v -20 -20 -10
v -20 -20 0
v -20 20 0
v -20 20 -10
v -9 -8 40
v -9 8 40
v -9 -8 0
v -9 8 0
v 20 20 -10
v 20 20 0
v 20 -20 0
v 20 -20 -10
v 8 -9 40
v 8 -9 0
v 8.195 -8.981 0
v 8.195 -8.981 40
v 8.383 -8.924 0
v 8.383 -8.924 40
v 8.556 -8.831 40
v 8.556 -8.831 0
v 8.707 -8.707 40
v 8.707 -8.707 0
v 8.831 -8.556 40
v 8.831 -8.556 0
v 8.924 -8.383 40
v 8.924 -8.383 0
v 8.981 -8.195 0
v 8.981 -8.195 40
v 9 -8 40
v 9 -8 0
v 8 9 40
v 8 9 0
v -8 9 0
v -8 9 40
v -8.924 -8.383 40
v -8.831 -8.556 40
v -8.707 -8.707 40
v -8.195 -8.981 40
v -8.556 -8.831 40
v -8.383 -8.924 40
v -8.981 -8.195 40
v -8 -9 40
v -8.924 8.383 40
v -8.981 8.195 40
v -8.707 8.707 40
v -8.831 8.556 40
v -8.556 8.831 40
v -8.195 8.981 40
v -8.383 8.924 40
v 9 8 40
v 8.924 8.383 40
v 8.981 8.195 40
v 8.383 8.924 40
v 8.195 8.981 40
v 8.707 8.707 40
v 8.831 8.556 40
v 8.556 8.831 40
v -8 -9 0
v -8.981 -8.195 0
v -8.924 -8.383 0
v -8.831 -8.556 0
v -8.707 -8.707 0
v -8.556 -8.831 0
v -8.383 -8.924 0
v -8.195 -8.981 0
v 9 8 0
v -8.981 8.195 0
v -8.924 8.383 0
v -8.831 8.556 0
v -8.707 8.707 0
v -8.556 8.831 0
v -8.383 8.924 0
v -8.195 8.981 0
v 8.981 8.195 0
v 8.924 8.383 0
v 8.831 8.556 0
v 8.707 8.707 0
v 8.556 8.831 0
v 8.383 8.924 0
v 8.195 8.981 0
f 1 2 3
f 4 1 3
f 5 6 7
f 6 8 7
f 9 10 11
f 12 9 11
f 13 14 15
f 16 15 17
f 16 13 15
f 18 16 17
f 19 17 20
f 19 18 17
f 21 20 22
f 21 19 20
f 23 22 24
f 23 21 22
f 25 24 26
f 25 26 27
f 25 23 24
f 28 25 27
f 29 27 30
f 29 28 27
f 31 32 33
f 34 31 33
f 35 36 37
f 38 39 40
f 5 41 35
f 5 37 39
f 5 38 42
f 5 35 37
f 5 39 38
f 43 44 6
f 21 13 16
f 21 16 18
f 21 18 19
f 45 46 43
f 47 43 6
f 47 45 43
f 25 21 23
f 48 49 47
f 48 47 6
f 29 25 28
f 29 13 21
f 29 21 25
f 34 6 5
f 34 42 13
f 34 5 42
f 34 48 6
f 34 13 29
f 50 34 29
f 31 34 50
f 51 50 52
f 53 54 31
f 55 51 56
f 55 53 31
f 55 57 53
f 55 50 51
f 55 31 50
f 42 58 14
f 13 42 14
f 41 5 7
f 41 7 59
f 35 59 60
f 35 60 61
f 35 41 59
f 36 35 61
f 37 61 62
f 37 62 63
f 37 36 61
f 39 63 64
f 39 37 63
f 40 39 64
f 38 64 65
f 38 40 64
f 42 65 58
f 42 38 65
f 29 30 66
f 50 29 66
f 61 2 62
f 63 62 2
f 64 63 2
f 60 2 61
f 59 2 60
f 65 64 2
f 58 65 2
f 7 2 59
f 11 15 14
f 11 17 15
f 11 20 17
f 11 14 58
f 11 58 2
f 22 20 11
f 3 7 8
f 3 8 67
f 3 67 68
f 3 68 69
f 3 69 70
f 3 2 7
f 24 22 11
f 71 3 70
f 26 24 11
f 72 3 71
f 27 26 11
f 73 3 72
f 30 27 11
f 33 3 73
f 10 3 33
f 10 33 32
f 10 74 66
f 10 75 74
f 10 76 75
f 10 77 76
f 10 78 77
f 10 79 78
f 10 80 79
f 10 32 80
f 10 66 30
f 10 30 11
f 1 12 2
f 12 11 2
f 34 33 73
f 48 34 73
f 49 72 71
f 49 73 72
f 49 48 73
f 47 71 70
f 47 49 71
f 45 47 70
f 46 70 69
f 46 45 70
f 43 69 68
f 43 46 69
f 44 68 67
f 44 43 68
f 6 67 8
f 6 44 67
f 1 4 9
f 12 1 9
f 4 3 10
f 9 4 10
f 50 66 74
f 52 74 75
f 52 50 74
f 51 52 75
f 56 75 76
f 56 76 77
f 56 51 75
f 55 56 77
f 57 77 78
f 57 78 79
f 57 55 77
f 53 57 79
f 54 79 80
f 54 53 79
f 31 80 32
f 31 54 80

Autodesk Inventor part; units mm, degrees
ref_plane "YZ Plane" through (0, 0, 0) normal (1, 0, 0) x (0, 1, 0)
ref_plane "XZ Plane" through (0, 0, 0) normal (0, 1, 0) x (-1, 0, 0)
ref_plane "XY Plane" through (0, 0, 0) normal (0, 0, 1) x (1, 0, 0)
sketch "Náčrt1" plane through (0, 0, 0) normal (0, 0, 1) x (1, 0, 0)
  line L0 (-9, -9) -> (9, -9)
  line L1 (9, -9) -> (9, 9)
  line L2 (9, 9) -> (-9, 9)
  line L3 (-9, 9) -> (-9, -9)
  line L4 (-9, -9) -> (9, 9) construction
  line L5 (9, -9) -> (-9, 9) construction
  line L6 (20, -20) -> (-20, -20)
  line L7 (-20, -20) -> (-20, 20)
  line L8 (-20, 20) -> (20, 20)
  line L9 (20, 20) -> (20, -20)
  line L10 (20, -20) -> (-20, 20) construction
  line L11 (-20, -20) -> (20, 20) construction
  point P0 (0, 0)
  dimension "d0" = 18
  dimension "d1" = 18
  dimension "d2" = 40
  dimension "d3" = 40
extrude "Vysunutí1" add sketch "Náčrt1" along normal blind 40 contours L3 L2 L1 L0
extrude "Vysunutí2" add sketch "Náčrt1" against normal blind 10 contours L3 L2 L1 L0 | L6 L7 L8 L9
fillet "Zaoblení1" radius 1 4 edges at (9, 9, 20) (9, -9, 20) (-9, -9, 20) (-9, 9, 20)
properties part number "motor držák"
